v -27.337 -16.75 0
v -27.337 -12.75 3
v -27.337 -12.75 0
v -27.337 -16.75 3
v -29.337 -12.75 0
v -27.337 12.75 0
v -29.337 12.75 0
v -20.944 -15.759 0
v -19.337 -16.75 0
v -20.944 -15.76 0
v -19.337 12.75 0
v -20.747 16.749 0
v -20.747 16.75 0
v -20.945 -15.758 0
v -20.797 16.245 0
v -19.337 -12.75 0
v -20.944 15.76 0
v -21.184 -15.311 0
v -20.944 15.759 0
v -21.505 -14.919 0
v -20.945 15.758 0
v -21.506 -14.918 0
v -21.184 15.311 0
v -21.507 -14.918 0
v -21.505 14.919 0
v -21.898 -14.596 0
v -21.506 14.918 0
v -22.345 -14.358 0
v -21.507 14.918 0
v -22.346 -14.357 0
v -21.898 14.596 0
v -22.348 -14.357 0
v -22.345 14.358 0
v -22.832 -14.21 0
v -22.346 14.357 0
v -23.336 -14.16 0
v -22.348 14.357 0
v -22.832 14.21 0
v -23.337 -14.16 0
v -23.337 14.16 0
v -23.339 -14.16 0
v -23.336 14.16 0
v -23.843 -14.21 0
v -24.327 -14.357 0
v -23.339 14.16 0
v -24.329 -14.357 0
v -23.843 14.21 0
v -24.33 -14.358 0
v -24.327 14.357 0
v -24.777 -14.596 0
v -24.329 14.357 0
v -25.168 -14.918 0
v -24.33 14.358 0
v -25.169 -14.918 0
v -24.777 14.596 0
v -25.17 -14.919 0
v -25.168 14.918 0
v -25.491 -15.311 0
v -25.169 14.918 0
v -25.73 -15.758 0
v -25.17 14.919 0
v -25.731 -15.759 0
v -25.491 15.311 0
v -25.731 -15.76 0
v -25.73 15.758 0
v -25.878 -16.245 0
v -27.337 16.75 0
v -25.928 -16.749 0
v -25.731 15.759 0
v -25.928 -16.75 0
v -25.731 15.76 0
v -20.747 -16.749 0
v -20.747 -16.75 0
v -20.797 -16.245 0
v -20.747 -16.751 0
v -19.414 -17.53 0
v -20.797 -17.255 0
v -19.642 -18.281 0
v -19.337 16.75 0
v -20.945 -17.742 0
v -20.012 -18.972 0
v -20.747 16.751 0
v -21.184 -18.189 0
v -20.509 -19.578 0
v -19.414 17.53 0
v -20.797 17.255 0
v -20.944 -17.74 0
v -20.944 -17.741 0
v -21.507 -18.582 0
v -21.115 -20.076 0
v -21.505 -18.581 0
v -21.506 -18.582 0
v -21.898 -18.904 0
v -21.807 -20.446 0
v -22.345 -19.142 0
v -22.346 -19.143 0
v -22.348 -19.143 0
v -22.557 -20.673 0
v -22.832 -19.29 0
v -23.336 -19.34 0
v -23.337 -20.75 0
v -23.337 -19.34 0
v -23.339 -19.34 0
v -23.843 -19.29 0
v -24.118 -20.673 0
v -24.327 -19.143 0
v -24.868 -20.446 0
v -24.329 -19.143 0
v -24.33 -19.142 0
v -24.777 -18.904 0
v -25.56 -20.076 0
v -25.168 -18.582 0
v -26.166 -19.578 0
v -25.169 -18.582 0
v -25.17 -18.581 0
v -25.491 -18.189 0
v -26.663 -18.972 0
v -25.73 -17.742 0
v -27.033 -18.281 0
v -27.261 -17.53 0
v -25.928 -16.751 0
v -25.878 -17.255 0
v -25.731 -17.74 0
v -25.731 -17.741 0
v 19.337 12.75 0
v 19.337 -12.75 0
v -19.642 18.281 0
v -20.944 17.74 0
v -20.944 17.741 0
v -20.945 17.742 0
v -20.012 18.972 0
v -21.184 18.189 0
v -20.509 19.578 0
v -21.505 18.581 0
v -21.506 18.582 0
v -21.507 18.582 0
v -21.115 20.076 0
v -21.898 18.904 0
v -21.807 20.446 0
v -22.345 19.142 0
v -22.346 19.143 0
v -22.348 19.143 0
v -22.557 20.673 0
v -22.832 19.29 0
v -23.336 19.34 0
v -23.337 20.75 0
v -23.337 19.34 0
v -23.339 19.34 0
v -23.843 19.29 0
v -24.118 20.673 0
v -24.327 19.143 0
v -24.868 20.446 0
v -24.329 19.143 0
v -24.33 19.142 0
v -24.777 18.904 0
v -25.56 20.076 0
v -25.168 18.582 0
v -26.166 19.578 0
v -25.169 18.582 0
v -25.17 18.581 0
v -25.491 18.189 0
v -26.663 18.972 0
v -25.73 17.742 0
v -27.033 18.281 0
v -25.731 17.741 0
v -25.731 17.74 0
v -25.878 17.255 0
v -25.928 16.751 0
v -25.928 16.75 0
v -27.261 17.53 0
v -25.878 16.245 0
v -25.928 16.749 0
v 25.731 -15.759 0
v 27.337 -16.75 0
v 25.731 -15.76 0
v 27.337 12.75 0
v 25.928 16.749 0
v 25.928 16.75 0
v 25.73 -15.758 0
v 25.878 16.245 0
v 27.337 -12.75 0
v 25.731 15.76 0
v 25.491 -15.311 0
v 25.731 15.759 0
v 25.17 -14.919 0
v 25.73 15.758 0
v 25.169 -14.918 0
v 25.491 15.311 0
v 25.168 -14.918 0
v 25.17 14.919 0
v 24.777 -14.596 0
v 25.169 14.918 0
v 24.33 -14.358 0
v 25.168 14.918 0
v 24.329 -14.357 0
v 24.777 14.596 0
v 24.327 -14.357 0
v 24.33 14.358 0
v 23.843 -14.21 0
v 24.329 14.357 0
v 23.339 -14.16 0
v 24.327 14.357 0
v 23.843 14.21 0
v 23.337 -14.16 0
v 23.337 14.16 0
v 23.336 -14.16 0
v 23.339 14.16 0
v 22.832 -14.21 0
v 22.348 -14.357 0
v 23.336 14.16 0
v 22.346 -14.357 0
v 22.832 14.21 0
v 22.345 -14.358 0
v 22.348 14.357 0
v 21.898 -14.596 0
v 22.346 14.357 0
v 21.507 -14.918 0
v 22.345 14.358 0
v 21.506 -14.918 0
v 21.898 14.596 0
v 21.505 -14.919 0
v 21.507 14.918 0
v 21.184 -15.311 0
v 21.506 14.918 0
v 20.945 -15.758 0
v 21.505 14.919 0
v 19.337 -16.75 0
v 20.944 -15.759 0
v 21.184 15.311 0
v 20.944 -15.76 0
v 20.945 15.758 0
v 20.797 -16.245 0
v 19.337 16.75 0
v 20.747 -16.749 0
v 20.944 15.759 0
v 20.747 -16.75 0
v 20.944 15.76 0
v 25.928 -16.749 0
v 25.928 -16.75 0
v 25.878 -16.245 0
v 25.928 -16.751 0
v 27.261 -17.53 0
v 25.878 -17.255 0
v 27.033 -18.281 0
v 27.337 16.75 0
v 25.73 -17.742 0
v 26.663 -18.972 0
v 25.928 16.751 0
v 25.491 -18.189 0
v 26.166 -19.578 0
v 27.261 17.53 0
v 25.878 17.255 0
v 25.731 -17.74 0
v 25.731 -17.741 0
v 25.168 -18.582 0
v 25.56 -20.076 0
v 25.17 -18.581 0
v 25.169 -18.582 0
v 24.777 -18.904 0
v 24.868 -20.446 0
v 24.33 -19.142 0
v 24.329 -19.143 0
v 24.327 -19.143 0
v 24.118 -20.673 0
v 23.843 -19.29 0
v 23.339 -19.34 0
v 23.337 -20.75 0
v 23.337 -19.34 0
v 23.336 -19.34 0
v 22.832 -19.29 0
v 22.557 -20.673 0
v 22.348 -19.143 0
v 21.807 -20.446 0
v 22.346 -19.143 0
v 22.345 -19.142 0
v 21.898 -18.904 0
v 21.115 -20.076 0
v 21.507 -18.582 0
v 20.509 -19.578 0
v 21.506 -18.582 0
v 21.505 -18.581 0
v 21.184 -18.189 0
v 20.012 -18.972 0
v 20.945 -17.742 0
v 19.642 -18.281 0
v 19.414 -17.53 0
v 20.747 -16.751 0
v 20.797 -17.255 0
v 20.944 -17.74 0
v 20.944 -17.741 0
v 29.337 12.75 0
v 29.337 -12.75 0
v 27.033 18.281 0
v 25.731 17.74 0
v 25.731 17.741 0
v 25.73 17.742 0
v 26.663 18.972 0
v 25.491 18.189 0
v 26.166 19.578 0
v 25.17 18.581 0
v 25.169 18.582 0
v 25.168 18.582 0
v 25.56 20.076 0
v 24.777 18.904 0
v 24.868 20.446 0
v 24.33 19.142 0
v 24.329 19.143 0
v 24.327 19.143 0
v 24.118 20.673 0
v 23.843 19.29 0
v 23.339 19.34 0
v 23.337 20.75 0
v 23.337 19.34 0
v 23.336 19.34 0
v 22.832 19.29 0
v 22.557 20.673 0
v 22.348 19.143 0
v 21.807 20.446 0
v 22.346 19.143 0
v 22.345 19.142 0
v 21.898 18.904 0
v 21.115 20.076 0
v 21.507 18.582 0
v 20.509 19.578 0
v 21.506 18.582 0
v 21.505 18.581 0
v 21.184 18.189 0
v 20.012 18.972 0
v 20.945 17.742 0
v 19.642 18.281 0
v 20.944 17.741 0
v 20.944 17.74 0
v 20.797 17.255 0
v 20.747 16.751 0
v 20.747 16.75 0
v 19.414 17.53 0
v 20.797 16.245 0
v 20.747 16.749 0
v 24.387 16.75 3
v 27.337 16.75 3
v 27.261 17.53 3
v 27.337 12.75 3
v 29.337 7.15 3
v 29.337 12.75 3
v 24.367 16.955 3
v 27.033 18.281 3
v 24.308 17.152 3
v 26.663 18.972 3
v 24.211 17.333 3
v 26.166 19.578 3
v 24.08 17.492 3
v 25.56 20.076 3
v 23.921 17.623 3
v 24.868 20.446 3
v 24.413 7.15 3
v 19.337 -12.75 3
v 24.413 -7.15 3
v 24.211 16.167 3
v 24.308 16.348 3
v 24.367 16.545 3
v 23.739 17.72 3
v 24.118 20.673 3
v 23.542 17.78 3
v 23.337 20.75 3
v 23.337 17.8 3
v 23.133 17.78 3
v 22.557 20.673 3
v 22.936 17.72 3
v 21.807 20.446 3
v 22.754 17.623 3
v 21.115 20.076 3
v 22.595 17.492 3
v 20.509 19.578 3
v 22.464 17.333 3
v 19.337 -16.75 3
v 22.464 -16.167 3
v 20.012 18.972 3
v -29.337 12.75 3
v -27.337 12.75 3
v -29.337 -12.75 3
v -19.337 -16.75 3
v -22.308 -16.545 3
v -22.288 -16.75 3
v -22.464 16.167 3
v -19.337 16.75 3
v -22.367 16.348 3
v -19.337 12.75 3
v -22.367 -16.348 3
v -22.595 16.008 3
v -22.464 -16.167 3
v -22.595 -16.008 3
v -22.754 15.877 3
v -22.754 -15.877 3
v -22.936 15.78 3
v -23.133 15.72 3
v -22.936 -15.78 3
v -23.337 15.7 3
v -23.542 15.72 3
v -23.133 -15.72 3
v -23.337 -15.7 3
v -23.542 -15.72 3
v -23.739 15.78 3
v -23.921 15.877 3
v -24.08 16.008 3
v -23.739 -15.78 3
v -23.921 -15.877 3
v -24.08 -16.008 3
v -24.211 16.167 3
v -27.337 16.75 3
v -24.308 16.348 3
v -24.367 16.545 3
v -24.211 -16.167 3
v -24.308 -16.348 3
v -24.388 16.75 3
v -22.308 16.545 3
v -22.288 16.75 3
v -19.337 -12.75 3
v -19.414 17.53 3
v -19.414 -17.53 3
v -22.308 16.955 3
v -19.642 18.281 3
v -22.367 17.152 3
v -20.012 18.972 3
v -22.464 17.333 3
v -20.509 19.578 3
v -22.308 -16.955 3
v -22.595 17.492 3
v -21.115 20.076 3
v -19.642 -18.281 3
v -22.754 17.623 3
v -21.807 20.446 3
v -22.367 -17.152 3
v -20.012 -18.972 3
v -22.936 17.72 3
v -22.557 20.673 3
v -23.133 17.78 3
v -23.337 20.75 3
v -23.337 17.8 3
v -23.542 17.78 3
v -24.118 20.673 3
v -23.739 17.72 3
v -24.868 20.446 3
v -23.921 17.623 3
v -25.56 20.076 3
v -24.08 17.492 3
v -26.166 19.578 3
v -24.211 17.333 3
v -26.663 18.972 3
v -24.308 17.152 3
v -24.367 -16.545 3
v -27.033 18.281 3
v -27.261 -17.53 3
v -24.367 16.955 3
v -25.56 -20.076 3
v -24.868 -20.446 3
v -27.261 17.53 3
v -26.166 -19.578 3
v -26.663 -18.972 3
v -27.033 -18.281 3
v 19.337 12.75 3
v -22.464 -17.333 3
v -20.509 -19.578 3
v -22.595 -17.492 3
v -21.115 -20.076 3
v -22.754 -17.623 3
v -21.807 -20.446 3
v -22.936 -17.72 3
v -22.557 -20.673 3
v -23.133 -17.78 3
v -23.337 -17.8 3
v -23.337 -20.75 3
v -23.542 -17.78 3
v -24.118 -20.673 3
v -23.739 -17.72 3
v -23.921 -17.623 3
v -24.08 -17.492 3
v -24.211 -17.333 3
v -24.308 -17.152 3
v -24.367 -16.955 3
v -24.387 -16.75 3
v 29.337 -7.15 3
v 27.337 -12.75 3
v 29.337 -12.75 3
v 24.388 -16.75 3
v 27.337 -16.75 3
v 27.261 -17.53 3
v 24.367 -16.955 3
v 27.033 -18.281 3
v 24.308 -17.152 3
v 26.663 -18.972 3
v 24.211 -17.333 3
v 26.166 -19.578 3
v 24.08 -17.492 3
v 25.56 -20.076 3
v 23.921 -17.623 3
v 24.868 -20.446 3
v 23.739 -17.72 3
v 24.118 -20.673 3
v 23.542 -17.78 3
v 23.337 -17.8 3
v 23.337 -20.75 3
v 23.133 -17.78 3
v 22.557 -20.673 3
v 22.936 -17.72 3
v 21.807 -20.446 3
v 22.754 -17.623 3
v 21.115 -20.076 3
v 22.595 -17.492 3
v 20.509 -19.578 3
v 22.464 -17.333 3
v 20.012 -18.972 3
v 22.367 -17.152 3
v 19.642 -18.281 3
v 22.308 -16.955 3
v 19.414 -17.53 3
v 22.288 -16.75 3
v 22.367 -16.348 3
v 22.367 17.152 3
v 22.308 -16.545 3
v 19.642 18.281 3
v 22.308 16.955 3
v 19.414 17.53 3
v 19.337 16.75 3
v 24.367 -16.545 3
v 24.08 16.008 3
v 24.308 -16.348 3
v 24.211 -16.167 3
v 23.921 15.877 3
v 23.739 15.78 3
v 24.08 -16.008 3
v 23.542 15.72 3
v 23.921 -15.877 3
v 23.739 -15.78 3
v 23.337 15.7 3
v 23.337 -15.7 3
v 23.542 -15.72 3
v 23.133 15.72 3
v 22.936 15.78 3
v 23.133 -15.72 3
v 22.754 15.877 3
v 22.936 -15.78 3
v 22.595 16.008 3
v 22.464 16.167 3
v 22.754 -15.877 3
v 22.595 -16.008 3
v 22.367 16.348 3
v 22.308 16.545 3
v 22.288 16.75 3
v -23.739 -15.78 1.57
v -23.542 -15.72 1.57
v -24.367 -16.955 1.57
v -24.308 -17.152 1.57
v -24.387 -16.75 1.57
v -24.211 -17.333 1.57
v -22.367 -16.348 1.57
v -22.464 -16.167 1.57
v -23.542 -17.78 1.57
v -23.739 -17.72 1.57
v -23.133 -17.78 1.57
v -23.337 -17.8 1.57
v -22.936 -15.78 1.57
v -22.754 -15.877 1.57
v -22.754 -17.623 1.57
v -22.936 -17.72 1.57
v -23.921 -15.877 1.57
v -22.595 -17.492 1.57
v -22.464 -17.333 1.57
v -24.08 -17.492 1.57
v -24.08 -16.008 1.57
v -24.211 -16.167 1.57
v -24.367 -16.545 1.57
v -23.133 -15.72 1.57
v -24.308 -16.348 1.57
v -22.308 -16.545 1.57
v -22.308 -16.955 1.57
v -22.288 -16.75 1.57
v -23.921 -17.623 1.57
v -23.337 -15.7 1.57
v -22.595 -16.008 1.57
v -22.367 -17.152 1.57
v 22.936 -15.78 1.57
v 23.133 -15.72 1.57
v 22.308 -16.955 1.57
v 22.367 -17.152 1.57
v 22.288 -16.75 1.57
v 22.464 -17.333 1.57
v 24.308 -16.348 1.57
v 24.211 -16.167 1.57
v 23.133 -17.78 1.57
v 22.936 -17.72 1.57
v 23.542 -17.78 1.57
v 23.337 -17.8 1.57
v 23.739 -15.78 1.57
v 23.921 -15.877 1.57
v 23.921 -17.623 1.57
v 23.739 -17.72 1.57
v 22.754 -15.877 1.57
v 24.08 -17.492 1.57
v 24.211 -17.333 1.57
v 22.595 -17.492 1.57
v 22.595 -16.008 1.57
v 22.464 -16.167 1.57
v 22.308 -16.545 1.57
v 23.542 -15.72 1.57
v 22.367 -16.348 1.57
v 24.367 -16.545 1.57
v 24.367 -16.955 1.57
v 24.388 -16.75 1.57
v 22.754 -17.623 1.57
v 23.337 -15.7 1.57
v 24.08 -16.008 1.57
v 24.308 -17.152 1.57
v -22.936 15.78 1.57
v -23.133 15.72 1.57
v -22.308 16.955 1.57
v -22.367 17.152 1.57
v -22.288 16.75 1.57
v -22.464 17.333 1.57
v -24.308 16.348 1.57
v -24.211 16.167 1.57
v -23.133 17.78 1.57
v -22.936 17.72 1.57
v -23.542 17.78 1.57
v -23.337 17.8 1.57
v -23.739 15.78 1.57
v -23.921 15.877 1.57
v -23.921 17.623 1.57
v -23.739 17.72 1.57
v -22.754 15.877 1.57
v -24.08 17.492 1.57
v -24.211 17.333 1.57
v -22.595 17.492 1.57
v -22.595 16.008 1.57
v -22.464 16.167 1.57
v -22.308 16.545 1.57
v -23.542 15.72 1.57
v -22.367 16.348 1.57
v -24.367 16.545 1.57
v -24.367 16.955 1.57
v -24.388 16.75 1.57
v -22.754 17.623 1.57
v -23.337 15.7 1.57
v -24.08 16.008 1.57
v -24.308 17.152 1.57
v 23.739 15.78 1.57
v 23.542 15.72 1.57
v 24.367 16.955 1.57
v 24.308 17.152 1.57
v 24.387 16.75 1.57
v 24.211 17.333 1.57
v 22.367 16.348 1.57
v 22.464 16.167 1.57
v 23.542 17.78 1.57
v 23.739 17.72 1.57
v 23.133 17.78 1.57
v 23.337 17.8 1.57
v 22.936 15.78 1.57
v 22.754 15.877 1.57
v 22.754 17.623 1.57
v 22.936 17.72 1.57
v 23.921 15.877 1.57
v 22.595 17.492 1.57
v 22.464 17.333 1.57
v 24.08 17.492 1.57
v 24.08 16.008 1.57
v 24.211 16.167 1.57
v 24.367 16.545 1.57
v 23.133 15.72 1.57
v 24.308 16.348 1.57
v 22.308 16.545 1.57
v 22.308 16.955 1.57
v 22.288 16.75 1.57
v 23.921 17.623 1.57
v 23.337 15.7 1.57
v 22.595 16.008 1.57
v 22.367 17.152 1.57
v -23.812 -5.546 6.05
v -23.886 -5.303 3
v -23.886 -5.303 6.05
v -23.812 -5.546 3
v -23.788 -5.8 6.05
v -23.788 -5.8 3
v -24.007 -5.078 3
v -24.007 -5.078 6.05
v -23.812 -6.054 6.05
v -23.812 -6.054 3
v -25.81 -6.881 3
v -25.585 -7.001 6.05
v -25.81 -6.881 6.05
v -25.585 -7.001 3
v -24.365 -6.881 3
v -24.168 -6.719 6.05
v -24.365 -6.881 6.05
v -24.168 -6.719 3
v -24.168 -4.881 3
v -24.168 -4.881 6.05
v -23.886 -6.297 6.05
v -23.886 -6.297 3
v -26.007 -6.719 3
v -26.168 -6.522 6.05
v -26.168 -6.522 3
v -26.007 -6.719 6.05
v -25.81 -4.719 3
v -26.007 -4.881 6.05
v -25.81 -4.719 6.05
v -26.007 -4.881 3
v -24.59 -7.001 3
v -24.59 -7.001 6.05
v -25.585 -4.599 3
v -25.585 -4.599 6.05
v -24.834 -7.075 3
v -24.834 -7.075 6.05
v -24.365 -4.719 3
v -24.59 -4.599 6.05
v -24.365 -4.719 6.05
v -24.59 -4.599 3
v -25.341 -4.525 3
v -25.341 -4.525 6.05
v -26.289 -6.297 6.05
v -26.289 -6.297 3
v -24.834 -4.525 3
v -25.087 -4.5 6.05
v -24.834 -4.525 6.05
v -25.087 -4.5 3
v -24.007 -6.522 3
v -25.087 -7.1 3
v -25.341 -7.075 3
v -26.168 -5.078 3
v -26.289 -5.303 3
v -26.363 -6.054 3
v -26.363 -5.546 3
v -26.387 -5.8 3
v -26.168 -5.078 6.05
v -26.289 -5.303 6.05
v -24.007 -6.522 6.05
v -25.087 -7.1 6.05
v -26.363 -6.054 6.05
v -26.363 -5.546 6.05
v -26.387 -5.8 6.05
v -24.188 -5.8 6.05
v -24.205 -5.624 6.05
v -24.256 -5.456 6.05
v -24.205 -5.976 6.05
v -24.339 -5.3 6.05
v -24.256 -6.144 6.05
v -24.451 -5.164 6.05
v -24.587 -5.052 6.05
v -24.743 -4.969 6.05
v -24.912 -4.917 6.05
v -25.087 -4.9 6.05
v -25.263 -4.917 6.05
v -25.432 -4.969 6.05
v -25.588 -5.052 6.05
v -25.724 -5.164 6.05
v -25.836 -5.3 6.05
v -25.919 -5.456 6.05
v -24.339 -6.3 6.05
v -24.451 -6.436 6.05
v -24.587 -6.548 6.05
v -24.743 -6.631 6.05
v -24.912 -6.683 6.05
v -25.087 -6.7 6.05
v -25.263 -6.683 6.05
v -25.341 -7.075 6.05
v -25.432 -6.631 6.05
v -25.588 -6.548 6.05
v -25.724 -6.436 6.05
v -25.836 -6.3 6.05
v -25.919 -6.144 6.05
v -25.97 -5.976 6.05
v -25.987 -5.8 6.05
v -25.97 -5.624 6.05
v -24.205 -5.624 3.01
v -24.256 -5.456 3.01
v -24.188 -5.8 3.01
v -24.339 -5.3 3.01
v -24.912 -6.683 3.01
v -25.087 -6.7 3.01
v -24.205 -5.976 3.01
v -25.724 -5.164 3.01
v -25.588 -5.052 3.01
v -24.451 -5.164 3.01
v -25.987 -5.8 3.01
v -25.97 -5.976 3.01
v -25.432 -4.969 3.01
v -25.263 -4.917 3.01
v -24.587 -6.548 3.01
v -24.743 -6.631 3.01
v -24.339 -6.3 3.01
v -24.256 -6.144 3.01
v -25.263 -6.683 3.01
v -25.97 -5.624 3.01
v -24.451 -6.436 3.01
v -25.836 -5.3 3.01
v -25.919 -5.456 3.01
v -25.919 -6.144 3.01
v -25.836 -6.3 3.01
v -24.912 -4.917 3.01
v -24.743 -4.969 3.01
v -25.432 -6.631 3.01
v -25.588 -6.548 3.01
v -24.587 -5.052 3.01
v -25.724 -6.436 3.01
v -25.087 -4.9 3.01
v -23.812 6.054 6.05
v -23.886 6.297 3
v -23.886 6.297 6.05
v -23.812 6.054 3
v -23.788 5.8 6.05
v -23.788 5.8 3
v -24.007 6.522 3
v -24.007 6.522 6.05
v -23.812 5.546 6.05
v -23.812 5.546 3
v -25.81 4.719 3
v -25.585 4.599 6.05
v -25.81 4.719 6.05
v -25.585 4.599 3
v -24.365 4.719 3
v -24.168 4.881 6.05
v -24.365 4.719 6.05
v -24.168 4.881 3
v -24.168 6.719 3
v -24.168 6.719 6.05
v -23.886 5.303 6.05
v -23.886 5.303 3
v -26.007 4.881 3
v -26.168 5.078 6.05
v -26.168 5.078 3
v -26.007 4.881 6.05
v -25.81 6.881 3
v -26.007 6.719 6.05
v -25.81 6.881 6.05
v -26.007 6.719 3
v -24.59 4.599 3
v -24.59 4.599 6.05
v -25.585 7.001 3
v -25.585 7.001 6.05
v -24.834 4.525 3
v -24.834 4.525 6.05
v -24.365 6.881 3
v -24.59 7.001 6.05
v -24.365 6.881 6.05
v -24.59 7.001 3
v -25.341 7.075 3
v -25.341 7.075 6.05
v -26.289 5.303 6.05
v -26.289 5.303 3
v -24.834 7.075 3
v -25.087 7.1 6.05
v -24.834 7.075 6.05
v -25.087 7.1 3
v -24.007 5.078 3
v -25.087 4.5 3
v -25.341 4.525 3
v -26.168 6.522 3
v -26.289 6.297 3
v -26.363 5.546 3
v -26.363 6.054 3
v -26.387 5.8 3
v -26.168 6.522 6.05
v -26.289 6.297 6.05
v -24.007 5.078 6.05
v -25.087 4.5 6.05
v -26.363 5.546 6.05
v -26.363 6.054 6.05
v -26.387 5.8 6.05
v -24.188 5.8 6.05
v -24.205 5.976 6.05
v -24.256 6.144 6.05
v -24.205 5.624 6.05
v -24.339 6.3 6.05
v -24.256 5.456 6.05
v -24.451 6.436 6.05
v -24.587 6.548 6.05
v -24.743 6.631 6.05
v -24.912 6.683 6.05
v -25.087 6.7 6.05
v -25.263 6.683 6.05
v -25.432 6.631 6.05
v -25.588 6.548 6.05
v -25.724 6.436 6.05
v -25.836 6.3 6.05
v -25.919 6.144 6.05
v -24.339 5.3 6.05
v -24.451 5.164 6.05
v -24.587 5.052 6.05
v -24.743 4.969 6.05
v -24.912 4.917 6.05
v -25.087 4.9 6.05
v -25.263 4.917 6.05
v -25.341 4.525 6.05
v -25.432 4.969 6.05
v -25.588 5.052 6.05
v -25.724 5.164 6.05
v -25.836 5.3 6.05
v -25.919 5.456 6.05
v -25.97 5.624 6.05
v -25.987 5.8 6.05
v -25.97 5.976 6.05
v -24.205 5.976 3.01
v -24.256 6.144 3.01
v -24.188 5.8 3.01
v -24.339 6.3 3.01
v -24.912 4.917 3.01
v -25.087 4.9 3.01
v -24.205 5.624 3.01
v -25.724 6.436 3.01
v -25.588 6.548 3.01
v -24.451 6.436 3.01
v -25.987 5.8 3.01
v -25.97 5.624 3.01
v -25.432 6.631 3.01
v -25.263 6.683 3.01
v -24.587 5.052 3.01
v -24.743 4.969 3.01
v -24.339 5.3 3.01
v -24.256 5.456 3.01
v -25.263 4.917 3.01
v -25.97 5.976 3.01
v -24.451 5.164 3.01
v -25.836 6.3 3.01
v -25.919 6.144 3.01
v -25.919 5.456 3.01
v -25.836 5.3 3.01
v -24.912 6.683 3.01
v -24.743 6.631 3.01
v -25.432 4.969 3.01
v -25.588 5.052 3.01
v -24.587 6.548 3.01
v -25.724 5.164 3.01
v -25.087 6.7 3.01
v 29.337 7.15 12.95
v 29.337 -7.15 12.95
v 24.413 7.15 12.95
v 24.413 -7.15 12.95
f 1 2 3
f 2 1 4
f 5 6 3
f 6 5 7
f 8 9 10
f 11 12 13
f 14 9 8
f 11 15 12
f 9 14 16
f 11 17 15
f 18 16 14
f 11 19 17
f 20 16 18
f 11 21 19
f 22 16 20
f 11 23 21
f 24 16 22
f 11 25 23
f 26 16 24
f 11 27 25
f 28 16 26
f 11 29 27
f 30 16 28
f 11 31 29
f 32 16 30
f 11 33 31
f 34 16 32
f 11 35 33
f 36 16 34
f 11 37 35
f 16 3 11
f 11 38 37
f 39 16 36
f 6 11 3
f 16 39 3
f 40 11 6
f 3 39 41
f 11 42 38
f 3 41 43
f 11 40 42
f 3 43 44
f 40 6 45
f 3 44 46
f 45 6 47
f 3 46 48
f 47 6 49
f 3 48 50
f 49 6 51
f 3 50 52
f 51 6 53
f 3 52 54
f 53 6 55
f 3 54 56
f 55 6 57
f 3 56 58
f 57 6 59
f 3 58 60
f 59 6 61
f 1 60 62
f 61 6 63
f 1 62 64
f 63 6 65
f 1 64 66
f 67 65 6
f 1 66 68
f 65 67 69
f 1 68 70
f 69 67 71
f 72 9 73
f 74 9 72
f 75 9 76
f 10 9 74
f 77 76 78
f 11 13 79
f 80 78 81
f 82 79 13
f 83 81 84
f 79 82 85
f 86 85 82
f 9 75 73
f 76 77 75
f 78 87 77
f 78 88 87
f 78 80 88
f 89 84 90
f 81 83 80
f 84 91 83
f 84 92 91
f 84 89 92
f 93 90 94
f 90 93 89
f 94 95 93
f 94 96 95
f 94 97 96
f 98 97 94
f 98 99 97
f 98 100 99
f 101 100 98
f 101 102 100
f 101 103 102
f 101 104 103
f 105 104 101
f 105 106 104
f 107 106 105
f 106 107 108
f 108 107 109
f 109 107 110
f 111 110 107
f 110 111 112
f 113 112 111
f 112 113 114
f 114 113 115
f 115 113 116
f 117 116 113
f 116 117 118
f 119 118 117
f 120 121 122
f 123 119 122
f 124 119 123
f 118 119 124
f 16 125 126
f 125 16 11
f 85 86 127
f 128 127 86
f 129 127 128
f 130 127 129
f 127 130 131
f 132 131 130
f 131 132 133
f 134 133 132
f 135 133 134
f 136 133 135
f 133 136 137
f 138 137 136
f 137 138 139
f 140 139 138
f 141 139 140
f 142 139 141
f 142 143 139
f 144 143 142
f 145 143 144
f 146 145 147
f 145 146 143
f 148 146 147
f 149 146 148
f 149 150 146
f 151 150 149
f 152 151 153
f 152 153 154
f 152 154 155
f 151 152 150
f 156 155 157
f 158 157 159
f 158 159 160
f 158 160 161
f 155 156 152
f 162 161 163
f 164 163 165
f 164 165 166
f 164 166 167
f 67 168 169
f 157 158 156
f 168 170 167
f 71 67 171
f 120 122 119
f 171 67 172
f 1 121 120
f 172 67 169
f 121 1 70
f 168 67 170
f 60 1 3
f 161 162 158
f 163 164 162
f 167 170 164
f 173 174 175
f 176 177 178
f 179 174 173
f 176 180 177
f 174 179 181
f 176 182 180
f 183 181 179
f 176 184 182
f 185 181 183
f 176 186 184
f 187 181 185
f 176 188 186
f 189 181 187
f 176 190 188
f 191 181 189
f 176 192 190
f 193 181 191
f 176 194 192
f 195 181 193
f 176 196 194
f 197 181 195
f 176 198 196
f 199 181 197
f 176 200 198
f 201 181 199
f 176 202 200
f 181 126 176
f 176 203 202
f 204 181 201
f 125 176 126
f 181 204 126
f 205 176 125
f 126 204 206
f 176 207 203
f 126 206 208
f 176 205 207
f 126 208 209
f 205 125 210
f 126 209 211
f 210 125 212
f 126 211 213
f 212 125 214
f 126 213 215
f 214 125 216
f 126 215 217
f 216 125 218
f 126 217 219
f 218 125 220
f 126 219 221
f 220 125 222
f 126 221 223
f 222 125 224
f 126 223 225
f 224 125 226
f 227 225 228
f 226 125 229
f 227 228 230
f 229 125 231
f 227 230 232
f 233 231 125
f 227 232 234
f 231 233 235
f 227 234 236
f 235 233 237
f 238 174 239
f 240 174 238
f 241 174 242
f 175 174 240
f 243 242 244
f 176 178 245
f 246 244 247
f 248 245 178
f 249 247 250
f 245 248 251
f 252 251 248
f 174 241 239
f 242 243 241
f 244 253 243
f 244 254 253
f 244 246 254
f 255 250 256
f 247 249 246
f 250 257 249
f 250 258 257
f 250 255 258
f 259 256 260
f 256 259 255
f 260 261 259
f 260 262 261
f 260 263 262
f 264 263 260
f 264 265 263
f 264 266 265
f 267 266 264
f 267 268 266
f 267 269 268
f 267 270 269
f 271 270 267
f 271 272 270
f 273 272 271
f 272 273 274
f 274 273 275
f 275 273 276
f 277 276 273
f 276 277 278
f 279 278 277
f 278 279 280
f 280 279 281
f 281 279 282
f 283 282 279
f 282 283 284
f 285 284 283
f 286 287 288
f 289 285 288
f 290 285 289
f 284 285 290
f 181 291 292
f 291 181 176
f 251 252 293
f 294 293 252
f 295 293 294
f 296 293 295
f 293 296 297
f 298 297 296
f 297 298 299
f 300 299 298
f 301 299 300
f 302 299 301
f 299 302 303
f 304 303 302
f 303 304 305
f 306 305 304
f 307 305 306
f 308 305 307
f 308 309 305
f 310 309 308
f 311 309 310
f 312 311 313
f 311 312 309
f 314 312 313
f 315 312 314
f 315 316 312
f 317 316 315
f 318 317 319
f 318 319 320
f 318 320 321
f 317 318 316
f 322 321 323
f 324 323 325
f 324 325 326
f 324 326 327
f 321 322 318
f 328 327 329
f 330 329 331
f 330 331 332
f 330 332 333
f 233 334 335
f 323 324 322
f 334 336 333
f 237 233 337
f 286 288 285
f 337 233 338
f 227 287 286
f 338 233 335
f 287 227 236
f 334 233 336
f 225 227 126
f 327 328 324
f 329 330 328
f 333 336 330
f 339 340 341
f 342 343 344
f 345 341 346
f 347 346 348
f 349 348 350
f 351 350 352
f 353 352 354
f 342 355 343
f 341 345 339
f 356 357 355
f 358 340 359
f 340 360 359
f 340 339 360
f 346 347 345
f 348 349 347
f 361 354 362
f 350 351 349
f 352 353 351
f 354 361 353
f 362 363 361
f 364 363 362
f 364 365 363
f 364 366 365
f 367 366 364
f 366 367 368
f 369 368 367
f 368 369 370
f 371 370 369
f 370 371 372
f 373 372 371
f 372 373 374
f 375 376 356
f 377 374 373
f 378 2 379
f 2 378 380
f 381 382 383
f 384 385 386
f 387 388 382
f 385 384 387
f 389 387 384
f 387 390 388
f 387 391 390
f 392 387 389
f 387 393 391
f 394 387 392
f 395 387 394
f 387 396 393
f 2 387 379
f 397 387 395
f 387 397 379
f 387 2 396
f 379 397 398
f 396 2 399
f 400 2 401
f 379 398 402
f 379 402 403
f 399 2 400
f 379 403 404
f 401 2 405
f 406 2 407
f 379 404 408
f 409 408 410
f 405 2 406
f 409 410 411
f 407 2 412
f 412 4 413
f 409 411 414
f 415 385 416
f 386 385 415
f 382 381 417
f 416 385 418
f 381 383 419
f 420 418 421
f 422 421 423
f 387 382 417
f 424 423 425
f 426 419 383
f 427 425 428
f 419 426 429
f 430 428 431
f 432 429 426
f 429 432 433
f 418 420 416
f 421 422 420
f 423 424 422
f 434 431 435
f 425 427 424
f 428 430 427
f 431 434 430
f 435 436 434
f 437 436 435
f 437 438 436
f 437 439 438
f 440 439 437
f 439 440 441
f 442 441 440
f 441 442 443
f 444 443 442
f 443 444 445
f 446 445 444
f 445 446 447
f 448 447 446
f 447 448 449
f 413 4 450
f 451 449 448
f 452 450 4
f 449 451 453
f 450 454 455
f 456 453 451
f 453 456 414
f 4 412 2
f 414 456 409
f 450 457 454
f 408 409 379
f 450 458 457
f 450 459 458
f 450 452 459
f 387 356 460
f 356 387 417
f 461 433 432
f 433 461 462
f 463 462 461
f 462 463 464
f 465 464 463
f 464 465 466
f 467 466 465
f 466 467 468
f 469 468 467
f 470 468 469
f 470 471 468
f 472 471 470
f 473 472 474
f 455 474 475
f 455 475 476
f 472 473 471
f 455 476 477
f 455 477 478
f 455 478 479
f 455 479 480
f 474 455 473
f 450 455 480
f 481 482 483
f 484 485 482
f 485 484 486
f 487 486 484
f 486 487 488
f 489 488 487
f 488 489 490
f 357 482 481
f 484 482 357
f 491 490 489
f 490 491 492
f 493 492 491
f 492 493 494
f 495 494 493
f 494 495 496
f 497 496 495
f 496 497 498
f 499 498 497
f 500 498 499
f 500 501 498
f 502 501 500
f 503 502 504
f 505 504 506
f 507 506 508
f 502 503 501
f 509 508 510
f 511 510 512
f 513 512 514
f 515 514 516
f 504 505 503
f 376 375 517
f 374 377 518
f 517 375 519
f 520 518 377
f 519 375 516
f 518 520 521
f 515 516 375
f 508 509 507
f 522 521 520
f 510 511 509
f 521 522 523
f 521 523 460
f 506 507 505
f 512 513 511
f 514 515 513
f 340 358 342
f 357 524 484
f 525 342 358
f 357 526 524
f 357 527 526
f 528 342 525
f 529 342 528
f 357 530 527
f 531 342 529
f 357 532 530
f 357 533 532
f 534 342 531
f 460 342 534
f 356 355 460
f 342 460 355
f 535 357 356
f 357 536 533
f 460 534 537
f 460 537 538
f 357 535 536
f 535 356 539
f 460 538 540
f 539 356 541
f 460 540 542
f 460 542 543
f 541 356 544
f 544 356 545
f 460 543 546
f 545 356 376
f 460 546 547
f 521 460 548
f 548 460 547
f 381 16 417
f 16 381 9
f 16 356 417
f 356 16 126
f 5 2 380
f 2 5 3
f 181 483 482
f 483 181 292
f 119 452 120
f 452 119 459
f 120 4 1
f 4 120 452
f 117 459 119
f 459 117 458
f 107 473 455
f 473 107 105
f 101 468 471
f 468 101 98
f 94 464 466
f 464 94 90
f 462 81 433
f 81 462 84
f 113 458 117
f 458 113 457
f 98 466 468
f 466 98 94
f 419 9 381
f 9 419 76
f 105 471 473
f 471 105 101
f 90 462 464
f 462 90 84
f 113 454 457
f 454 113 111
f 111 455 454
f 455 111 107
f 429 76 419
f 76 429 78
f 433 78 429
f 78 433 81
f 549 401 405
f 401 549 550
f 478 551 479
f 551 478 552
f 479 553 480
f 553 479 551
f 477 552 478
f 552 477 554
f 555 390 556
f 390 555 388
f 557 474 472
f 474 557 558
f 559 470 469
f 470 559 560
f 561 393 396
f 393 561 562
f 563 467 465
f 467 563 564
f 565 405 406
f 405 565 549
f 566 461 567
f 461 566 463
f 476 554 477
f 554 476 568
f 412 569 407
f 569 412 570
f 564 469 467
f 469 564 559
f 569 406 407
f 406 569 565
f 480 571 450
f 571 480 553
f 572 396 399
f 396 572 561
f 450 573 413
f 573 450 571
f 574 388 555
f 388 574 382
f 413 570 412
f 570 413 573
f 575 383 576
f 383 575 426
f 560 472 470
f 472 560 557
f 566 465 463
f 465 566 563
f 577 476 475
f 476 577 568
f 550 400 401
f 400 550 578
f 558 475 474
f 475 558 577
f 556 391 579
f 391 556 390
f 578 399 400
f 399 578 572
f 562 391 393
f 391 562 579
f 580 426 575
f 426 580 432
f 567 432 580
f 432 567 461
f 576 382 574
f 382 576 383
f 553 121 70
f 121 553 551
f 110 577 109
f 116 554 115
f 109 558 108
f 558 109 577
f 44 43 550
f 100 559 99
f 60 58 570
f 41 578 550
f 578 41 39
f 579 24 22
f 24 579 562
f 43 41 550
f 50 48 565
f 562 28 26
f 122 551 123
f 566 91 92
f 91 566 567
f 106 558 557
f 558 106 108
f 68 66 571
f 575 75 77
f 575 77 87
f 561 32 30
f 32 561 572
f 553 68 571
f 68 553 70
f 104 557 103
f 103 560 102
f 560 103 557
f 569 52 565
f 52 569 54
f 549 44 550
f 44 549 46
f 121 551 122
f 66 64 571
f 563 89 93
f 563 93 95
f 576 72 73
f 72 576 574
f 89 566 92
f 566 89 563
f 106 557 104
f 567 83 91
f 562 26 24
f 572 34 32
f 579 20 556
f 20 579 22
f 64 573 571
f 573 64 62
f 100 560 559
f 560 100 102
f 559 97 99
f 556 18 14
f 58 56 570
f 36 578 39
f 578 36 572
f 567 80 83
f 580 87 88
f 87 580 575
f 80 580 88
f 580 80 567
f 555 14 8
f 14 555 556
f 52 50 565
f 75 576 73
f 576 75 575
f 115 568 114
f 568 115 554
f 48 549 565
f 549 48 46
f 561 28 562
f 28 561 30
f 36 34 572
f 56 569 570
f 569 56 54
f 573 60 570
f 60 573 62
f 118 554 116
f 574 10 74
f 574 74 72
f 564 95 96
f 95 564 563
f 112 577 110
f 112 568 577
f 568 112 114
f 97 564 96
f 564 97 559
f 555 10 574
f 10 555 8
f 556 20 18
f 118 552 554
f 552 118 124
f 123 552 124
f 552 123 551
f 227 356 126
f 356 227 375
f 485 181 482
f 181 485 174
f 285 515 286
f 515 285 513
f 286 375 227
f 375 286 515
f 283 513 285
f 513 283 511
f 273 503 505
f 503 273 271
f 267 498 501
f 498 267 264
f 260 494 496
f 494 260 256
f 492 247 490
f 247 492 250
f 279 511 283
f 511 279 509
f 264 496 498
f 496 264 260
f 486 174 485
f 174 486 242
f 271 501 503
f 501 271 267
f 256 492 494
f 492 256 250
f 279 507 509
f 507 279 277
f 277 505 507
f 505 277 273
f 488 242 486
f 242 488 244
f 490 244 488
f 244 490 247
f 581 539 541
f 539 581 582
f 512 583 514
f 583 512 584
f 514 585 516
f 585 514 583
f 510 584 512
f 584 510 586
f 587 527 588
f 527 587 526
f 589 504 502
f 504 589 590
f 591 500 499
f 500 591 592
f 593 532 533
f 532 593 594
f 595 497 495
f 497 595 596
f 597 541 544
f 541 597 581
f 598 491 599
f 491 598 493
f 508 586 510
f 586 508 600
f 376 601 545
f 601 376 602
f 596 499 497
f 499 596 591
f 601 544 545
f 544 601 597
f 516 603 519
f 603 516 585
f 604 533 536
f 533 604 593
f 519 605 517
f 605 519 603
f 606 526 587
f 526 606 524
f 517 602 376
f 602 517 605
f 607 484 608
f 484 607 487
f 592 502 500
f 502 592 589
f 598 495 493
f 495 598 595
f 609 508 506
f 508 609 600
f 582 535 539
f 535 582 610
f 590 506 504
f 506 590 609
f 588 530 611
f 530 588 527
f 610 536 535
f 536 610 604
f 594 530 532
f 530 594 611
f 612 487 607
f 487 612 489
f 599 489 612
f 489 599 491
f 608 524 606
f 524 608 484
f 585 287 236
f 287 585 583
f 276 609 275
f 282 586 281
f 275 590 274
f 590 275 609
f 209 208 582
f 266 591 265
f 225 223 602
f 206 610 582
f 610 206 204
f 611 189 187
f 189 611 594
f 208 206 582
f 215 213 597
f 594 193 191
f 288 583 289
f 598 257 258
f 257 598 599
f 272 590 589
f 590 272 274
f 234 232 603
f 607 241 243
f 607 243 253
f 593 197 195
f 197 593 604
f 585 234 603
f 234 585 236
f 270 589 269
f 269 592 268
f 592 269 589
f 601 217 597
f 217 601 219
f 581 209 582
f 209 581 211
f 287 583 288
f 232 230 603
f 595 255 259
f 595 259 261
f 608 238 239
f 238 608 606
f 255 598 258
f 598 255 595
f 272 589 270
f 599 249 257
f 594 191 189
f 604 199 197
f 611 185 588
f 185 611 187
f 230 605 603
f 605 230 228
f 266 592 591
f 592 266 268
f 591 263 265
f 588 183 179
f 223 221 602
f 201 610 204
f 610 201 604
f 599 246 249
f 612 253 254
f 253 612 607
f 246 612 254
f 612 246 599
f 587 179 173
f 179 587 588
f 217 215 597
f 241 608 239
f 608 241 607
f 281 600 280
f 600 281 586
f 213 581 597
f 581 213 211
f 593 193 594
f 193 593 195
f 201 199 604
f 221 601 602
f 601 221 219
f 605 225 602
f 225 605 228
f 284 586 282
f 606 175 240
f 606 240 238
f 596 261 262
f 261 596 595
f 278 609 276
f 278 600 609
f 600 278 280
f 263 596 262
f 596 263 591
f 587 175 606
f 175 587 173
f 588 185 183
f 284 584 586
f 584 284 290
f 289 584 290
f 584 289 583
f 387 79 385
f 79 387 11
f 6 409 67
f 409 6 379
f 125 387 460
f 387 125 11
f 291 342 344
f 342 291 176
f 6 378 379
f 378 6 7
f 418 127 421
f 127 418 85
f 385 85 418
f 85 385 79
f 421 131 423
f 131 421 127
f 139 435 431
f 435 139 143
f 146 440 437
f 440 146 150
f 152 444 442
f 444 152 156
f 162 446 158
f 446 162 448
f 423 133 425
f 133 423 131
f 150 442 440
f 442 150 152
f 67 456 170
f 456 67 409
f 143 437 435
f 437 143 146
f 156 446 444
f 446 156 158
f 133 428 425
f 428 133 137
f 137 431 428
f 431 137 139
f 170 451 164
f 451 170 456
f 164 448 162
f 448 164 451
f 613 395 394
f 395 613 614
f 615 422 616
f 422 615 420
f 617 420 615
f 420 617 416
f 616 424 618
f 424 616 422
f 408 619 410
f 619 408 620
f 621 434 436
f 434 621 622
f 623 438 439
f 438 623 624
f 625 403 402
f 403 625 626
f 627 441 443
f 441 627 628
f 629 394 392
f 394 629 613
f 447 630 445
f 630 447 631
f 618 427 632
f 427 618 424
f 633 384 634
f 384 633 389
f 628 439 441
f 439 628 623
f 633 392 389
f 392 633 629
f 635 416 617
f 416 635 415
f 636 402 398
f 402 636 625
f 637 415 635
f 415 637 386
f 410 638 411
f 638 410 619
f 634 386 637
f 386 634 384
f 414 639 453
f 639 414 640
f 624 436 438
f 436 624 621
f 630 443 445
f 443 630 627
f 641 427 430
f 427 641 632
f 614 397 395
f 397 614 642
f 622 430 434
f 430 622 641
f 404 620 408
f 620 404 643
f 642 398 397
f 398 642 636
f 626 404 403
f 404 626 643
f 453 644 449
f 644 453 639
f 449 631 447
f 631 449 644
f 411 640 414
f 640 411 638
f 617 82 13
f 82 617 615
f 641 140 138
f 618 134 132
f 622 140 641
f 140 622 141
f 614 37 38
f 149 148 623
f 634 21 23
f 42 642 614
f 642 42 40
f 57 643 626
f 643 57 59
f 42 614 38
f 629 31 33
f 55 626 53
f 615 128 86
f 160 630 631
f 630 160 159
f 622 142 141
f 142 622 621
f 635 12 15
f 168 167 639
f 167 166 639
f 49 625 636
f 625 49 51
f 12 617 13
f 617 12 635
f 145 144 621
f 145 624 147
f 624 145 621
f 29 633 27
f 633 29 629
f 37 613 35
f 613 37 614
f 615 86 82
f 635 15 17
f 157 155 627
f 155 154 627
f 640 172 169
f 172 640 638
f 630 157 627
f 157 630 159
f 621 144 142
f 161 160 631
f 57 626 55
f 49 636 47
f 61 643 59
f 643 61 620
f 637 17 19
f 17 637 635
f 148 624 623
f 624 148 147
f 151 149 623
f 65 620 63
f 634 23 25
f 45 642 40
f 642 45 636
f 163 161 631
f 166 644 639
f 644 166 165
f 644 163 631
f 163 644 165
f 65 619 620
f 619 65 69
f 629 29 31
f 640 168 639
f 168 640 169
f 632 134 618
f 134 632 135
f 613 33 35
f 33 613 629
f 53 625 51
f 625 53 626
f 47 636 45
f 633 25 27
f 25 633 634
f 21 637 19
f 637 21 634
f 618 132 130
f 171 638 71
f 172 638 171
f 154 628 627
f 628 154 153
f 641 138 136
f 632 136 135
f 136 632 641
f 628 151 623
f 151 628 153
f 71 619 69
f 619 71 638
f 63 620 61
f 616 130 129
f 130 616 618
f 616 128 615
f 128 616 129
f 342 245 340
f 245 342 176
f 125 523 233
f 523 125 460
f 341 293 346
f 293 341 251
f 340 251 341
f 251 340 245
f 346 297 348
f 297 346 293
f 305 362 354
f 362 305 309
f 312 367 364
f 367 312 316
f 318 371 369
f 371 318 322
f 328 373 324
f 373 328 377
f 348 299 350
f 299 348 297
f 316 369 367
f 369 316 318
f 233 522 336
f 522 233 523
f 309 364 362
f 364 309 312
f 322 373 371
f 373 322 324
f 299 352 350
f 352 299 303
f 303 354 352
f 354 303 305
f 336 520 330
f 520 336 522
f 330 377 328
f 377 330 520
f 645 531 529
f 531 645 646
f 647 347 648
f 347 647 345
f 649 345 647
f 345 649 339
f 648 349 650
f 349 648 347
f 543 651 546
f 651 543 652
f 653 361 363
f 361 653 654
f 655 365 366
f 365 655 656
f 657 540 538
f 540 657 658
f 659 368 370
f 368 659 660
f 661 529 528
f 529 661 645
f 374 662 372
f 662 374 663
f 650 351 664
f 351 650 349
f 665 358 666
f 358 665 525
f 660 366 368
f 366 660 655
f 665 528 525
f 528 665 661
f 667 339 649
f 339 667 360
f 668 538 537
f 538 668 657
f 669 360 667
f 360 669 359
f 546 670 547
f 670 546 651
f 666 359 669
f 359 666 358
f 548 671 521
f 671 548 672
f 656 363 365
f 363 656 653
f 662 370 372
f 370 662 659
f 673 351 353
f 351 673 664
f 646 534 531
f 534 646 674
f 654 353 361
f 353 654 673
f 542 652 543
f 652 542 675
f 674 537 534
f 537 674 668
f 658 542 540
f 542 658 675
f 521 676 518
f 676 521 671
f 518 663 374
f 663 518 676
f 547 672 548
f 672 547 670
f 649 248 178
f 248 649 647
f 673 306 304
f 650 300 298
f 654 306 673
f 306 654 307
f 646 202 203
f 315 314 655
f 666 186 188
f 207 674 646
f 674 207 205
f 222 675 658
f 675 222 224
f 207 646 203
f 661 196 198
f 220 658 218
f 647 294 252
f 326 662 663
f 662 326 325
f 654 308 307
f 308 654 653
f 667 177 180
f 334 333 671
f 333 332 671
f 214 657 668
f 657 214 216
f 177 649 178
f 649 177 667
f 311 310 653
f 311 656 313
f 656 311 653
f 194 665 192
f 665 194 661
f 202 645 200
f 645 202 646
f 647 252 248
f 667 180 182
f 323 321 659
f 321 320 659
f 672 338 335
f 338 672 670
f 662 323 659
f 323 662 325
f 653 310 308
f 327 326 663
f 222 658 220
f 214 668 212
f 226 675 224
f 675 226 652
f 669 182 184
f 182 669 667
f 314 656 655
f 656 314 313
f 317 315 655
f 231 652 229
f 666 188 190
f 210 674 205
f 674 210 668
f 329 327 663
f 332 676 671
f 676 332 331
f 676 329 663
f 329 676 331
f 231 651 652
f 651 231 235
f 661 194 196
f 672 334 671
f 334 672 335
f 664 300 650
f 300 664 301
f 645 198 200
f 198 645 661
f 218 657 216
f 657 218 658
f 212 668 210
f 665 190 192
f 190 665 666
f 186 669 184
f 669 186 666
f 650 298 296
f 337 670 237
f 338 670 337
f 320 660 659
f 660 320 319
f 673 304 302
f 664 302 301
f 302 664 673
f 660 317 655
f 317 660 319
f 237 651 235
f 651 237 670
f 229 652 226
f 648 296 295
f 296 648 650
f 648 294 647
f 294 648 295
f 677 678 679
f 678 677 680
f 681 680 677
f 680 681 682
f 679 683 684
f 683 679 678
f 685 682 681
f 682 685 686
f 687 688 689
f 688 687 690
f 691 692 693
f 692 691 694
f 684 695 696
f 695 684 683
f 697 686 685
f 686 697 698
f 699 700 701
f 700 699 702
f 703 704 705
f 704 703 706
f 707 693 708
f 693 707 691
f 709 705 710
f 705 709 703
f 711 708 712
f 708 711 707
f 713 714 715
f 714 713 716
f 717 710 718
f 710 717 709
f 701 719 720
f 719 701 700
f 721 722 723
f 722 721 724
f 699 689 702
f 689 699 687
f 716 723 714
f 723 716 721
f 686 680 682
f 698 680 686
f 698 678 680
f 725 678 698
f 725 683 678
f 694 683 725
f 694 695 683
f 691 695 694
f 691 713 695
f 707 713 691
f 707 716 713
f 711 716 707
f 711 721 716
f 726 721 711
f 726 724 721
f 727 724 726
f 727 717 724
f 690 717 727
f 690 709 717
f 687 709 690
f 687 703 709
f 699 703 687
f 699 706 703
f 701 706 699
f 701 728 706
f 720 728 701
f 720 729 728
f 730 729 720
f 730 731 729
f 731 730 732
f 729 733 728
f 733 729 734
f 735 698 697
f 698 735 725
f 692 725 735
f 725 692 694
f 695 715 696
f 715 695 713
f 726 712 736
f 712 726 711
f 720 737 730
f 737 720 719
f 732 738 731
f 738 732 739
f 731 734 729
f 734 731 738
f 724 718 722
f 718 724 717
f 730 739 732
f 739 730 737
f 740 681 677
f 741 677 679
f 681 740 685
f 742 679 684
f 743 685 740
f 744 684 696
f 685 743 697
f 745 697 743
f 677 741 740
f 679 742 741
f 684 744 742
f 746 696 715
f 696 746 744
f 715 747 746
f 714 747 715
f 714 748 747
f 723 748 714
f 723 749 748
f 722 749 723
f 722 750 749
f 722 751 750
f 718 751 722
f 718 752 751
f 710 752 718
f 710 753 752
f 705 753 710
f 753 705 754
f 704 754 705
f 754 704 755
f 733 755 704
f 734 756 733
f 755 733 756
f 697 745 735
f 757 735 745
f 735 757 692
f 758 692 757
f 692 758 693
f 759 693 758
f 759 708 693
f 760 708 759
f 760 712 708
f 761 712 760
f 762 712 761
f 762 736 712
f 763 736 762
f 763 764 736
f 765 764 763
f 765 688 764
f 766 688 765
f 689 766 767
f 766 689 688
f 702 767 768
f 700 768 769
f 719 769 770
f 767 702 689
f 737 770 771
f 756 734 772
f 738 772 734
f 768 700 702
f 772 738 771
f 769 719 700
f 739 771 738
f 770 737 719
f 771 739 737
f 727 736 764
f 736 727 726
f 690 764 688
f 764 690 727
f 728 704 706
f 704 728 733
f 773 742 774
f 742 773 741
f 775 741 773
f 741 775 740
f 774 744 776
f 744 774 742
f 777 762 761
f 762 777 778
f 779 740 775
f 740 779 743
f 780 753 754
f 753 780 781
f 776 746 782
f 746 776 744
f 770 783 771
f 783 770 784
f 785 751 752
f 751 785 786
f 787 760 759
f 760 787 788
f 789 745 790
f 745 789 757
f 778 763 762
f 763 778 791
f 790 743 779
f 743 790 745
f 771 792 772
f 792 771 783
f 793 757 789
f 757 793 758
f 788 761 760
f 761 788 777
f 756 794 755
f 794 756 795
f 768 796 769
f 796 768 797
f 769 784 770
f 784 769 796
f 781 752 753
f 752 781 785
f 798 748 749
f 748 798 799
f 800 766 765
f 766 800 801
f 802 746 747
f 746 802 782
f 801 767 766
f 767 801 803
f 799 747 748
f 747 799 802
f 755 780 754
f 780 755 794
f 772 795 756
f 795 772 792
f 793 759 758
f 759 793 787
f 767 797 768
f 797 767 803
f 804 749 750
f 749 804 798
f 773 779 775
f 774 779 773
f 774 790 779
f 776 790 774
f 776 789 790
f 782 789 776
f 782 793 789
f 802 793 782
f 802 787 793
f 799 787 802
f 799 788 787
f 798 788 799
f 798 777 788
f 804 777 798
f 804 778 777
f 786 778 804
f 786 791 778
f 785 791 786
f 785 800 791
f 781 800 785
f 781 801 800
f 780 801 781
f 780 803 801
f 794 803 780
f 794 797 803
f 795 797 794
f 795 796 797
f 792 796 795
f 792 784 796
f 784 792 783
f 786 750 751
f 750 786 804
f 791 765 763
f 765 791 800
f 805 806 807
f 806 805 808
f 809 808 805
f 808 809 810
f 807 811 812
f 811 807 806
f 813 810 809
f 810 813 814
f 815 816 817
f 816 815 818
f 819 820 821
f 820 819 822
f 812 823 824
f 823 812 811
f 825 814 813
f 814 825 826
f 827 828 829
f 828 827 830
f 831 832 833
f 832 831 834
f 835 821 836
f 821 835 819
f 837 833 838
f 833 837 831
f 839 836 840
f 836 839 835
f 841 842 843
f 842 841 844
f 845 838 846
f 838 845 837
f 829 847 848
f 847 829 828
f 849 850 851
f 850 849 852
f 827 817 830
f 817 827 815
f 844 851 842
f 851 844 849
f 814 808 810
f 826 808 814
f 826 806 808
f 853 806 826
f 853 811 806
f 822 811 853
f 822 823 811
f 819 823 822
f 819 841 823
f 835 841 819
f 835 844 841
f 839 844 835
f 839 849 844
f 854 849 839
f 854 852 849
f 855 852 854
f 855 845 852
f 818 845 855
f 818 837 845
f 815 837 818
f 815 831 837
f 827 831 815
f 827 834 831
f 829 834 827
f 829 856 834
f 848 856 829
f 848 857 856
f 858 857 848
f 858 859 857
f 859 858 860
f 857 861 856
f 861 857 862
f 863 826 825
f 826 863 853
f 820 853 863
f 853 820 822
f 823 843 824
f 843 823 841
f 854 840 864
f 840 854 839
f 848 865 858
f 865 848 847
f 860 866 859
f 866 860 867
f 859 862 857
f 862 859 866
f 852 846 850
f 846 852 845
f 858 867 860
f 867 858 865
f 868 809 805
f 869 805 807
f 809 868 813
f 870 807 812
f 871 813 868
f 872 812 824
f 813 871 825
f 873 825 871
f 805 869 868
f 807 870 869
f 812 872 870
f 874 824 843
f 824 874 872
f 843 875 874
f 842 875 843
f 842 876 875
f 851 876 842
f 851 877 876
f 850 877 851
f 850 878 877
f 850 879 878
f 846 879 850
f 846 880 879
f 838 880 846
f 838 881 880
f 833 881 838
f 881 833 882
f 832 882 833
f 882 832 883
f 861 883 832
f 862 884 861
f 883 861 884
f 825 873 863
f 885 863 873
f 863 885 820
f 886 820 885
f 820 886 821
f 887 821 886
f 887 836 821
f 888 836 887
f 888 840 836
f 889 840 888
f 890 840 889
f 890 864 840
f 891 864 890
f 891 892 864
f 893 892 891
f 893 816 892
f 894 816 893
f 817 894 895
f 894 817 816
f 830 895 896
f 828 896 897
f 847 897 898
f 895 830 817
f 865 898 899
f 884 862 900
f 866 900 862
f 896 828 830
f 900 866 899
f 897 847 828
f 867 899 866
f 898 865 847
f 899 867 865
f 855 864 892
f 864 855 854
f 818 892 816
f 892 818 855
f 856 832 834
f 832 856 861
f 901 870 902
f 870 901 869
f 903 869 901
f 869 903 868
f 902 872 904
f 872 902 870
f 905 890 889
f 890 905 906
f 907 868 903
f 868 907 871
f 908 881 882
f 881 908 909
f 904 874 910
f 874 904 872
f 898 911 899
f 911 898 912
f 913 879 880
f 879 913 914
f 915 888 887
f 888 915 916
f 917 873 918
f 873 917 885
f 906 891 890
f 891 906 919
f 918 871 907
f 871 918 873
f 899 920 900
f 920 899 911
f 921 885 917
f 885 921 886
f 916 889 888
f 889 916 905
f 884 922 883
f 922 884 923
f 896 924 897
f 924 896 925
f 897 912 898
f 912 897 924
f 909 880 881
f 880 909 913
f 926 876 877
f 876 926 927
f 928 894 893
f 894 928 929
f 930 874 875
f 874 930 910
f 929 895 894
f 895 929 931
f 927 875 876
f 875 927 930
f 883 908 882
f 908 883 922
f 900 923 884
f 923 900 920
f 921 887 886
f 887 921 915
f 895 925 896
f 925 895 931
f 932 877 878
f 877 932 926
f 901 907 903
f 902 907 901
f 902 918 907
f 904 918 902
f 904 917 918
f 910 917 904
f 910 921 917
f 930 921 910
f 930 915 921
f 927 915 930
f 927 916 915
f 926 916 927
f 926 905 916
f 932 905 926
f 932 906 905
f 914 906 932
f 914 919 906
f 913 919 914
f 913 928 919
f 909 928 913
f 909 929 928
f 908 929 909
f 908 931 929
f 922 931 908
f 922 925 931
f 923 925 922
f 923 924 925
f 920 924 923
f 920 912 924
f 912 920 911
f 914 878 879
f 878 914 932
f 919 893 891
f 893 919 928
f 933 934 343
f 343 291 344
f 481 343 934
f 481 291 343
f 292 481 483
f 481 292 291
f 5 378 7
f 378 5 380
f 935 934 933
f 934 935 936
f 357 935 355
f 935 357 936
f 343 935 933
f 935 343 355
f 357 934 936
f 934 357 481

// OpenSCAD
// file: pico_sensor_dims.scad
// Component dimensions
pico_length = 51;
pico_width = 21;
pico_thickness = 1;
pico_hole_offset_chg = 2;
pico_hole_offset_w = 4.7;
pico_hole_diameter = 2.1;
pico_base_clearance = 2;
pico_height_chg = 3.65;
pico_cavity_height = pico_base_clearance + pico_height_chg + 0.5;

// Adafruit sensor dimensions
ada_hole_diameter = 3.1;
ada_hole_offset_w = 2.8;
ada_hole_offset_l_chg = 23;
ada_hole_offset_l_sens = 3.175;
ada_length_enclosed = 30;
ada_length_full = 76.2;
ada_length = 101.6;
ada_height = 1.65;
ada_width = 14.3;
ada_conn_height = 7.2;
//ada_vert_clearance = 1.5;
ada_vert_clearance = ada_conn_height - ada_height - pico_base_clearance + 0.25;
ada_conn_width = 8.65;

// Wiring hole
ps_wiring_hole_width = 10;
ps_wiring_hole_length = 10;
ps_wiring_hole_x = 10;

// default args
def_wall_thickness = 2;
def_clearance = 0.25;
def_base_thickness = 1;
def_pico_post_diameter = 1.6;

//boop
boop = 0.01;


// Function to get enclosure dimensions
function pico_sensor_enclosure_dims(
    wall_thickness = def_wall_thickness,
    clearance = def_clearance,
    base_thickness = def_base_thickness
) = [
    pico_length + ada_hole_offset_l_sens + (2 * clearance) + (2 * wall_thickness),
    pico_width + (2 * clearance) + (2 * wall_thickness),
    f_pico_cavity_z(base_thickness) + pico_cavity_height
];

function f_pico_cavity_z(
  base_thickness = 1
) = base_thickness + ada_height + ada_vert_clearance;

function get_pico_z(
  base_thickness
) = f_pico_cavity_z(base_thickness) + pico_base_clearance;

function pico_location(
  wall_thickness,
  clearance,
  base_thickness
) = [
  wall_thickness + clearance,
  wall_thickness + clearance,
  get_pico_z(base_thickness)
];
// file: support.scad
// Module for mounting post with optional support
module mounting_post_assembly(height, diameter, with_support = true, support_height = 0.5) {
  // Main post
  cylinder(h = height, d = diameter, $fn = 32);
  
  // Optional support base
  if (with_support) {
    translate([0, 0, -support_height])
      cylinder(h = support_height, d1 = diameter + 2, d2 = diameter, $fn = 32);
  }
}

// Module for a post with a riser base
module post_with_riser(post_height, post_diameter, riser_height, riser_diameter = 4) {
  // Riser
  cylinder(h = riser_height, d = riser_diameter, $fn = 32);
  
  // Post on top of riser
  translate([0, 0, riser_height - 0.5]) {
    mounting_post_assembly(post_height, post_diameter, true, 0.5);
  }
}

module post_socket(height, post_diameter, thickness = 1, clearance = 0.2) {
  difference() {
    cylinder(h = height, d = post_diameter + thickness, $fn = 32);
    translate([0, 0, -0.01])
    cylinder(h = height, d = post_diameter + clearance, $fn = 32);
  }
}

// Module for corner risers
module corner_riser(width, height) {
  cube([width, width, height]);
}

module screw_insert_tab(insert_diameter, tab_width, tab_height) {
  translate([-(tab_width/2), -(tab_width/2), 0])
  difference() {
    union() {
      cube([tab_width, tab_width/2, tab_height]);

      translate([tab_width/2, tab_width/2, 0])
        cylinder(h = tab_height, d = tab_width, $fn = 32);
    }

    translate([tab_width/2, tab_width/2, -0.01])
      cylinder(h = tab_height + 0.02, d = insert_diameter, $fn = 32);
  }
}

module screw_tab(tab_width, 
  tab_height, 
  screw_diameter, 
  screw_head_height, 
  screw_head_width) {

  translate([-(tab_width/2), -(tab_width/2), 0])
  difference() {
    union() {
      cube([tab_width, tab_width/2, tab_height]);

      translate([tab_width/2, tab_width/2, 0])
        cylinder(h = tab_height, d = tab_width, $fn = 32);
    }

    translate([tab_width/2, 
      tab_width/2, 
      -0.01])
      cylinder(h = tab_height + 0.02, 
        d = screw_diameter, 
        $fn = 32);
    
    translate([tab_width/2, 
      tab_width/2, 
      tab_height - screw_head_height])
      cylinder(h = screw_head_height + 0.01,
        d1 = screw_diameter,
        d2 = screw_head_width,
        $fn = 32);
        
  }
}

screw_insert_tab(4.5, 8, 5);
// main file
// The cover panel for pico_sensor_enclosure

use <support.scad>
include <pico_sensor_dims.scad>

lid_thickness = 3;

module pico_sensor_lid(
  wall_thickness = def_wall_thickness,
  clearance = def_clearance,
  base_thickness = def_base_thickness,

  pico_post_diameter = def_pico_post_diameter,

  screw_tab_width = 8,
  screw_tab_height = 3,
  screw_tab_edge_offset = 2,

  // Screw Specs
  screw_threading_diameter = 2.1,
  screw_head_width = 5.2,
  screw_head_height = 1.57
) {

  enc_dims = pico_sensor_enclosure_dims(wall_thickness, clearance, base_thickness);
  enclosure_length = enc_dims[0];
  enclosure_width = enc_dims[1];
  enclosure_height = enc_dims[2];

  sensor_tooth_height = get_sensor_tooth_height(enclosure_height, base_thickness, clearance);
  sensor_tooth_length = get_sensor_tooth_length(enclosure_length, wall_thickness, clearance);

  pico_loc = pico_location(wall_thickness, clearance, base_thickness);

  translate([-enclosure_length/2, -enclosure_width/2, 0])
  union() {
    cube([enclosure_length, enclosure_width, lid_thickness]);

    rotate(180)
    translate([-screw_tab_width/2 - screw_tab_edge_offset, 
    screw_tab_width/2, 
    0])
    screw_tab(screw_tab_width, screw_tab_height, screw_threading_diameter, screw_head_height, screw_head_width);
    rotate(180)
    translate([screw_tab_width/2 - enclosure_length + screw_tab_edge_offset, 
    screw_tab_width/2, 
    0])
    screw_tab(screw_tab_width, screw_tab_height, screw_threading_diameter, screw_head_height, screw_head_width);
    translate([screw_tab_width/2 + screw_tab_edge_offset, 
    screw_tab_width/2 + enclosure_width, 
    0])
    screw_tab(screw_tab_width, screw_tab_height, screw_threading_diameter, screw_head_height, screw_head_width);
    translate([-screw_tab_width/2 + enclosure_length - screw_tab_edge_offset, 
    screw_tab_width/2 + enclosure_width, 
    0])
    screw_tab(screw_tab_width, screw_tab_height, screw_threading_diameter, screw_head_height, screw_head_width);

    translate([enclosure_length - sensor_tooth_length,
      enclosure_width/2 - ada_width/2,
      -sensor_tooth_height])
    cube([sensor_tooth_length,
      ada_width,
      sensor_tooth_height]);
      
    translate([pico_loc[0] + pico_hole_offset_chg,
      pico_loc[1] + pico_hole_offset_w,
      -get_pico_post_socket_height(enclosure_height, base_thickness)])
    post_socket(
      get_pico_post_socket_height(enclosure_height, base_thickness), 
      pico_post_diameter);

    translate([pico_loc[0] + pico_hole_offset_chg,
      pico_loc[1] + pico_width - pico_hole_offset_w,
      -get_pico_post_socket_height(enclosure_height, base_thickness)])
    post_socket(
      get_pico_post_socket_height(enclosure_height, base_thickness), 
      pico_post_diameter);

  }

}

function get_sensor_tooth_height(
    enclosure_height,
    base_thickness,
    clearance,
) = enclosure_height - base_thickness - ada_height;

function get_sensor_tooth_length(
    enclosure_length,
    wall_thickness,
    clearance
) = enclosure_length - (wall_thickness + pico_length + (3*clearance));


function get_pico_post_socket_height(
    enclosure_height,
    base_thickness
) = enclosure_height - (get_pico_z(base_thickness)) - pico_thickness - 0.1;

translate([0,0,lid_thickness])
mirror([0,0,1]) 
  pico_sensor_lid();
